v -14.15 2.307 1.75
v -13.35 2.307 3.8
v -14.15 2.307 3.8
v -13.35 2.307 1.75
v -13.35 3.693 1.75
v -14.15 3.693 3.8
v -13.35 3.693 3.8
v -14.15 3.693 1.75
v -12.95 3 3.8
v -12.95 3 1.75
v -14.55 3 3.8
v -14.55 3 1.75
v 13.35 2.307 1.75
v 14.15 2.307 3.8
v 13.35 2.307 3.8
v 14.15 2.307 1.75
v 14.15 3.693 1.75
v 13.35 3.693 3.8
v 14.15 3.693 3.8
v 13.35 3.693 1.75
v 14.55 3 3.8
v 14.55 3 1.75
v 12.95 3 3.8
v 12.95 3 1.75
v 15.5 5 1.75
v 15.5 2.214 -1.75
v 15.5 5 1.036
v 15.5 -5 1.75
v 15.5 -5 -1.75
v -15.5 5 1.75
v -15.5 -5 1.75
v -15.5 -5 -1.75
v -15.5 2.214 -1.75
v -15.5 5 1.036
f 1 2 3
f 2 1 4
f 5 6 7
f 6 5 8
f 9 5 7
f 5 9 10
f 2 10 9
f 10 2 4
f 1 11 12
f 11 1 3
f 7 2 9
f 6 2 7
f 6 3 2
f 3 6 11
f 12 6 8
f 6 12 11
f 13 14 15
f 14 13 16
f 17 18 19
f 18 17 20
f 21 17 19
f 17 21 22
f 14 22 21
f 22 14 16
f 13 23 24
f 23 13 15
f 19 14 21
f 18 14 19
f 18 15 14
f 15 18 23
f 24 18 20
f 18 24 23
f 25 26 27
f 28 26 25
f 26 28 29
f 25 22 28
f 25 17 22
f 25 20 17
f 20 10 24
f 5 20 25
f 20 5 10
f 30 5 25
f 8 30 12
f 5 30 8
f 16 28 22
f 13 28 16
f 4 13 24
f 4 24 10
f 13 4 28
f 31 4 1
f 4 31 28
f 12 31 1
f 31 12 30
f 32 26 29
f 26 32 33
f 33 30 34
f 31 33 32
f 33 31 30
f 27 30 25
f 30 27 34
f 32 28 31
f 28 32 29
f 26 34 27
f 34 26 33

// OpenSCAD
body=[31,10,3.5];
hole_d=1.6;
hole_h=2.0;
hole_dist=27.5;

hdmi_width=17;
hdmi_height=14;
audio_width=5;
audio_height=13;
voltage_width=8;
voltage_height=7;

difference()
{
  union()
  {
    cube(body,center=true);
    // screw pins
    for(i=[-1:2:1])
      translate([hole_dist/2*i,3,body[2]/2+hole_h/2])
      cylinder(d=hole_d,h=hole_h+0.1,$fn=6,center=true);
  }
  // cut clearing for ribbon cable
  if(0)
  translate([0,0,body[2]/2])
    cube([hole_dist-5,20,2],center=true);
  // cut bottom stand
  // dip switch 
  // hdmi capacitors
  if(0)
  translate([-hole_dist/2+hdmi_width/2-3,+5,-body[2]/2])
    cube([hdmi_width,10,hdmi_height],center=true);
  // voltage selector
  if(0)
  translate([+hole_dist/2-voltage_width/2+0.01,-6,-body[2]/2])
    cube([voltage_width,10,voltage_height],center=true);
  // audio jack
  if(0)
  translate([hole_dist/2+audio_width/2,0,-body[2]/2])
    cube([audio_width,10,audio_height],center=true);
  // 45 deg transtion
  if(1)
  translate([0,7.5,0])
    rotate([45,0,0])
      cube([40,40,audio_width],center=true);
}
